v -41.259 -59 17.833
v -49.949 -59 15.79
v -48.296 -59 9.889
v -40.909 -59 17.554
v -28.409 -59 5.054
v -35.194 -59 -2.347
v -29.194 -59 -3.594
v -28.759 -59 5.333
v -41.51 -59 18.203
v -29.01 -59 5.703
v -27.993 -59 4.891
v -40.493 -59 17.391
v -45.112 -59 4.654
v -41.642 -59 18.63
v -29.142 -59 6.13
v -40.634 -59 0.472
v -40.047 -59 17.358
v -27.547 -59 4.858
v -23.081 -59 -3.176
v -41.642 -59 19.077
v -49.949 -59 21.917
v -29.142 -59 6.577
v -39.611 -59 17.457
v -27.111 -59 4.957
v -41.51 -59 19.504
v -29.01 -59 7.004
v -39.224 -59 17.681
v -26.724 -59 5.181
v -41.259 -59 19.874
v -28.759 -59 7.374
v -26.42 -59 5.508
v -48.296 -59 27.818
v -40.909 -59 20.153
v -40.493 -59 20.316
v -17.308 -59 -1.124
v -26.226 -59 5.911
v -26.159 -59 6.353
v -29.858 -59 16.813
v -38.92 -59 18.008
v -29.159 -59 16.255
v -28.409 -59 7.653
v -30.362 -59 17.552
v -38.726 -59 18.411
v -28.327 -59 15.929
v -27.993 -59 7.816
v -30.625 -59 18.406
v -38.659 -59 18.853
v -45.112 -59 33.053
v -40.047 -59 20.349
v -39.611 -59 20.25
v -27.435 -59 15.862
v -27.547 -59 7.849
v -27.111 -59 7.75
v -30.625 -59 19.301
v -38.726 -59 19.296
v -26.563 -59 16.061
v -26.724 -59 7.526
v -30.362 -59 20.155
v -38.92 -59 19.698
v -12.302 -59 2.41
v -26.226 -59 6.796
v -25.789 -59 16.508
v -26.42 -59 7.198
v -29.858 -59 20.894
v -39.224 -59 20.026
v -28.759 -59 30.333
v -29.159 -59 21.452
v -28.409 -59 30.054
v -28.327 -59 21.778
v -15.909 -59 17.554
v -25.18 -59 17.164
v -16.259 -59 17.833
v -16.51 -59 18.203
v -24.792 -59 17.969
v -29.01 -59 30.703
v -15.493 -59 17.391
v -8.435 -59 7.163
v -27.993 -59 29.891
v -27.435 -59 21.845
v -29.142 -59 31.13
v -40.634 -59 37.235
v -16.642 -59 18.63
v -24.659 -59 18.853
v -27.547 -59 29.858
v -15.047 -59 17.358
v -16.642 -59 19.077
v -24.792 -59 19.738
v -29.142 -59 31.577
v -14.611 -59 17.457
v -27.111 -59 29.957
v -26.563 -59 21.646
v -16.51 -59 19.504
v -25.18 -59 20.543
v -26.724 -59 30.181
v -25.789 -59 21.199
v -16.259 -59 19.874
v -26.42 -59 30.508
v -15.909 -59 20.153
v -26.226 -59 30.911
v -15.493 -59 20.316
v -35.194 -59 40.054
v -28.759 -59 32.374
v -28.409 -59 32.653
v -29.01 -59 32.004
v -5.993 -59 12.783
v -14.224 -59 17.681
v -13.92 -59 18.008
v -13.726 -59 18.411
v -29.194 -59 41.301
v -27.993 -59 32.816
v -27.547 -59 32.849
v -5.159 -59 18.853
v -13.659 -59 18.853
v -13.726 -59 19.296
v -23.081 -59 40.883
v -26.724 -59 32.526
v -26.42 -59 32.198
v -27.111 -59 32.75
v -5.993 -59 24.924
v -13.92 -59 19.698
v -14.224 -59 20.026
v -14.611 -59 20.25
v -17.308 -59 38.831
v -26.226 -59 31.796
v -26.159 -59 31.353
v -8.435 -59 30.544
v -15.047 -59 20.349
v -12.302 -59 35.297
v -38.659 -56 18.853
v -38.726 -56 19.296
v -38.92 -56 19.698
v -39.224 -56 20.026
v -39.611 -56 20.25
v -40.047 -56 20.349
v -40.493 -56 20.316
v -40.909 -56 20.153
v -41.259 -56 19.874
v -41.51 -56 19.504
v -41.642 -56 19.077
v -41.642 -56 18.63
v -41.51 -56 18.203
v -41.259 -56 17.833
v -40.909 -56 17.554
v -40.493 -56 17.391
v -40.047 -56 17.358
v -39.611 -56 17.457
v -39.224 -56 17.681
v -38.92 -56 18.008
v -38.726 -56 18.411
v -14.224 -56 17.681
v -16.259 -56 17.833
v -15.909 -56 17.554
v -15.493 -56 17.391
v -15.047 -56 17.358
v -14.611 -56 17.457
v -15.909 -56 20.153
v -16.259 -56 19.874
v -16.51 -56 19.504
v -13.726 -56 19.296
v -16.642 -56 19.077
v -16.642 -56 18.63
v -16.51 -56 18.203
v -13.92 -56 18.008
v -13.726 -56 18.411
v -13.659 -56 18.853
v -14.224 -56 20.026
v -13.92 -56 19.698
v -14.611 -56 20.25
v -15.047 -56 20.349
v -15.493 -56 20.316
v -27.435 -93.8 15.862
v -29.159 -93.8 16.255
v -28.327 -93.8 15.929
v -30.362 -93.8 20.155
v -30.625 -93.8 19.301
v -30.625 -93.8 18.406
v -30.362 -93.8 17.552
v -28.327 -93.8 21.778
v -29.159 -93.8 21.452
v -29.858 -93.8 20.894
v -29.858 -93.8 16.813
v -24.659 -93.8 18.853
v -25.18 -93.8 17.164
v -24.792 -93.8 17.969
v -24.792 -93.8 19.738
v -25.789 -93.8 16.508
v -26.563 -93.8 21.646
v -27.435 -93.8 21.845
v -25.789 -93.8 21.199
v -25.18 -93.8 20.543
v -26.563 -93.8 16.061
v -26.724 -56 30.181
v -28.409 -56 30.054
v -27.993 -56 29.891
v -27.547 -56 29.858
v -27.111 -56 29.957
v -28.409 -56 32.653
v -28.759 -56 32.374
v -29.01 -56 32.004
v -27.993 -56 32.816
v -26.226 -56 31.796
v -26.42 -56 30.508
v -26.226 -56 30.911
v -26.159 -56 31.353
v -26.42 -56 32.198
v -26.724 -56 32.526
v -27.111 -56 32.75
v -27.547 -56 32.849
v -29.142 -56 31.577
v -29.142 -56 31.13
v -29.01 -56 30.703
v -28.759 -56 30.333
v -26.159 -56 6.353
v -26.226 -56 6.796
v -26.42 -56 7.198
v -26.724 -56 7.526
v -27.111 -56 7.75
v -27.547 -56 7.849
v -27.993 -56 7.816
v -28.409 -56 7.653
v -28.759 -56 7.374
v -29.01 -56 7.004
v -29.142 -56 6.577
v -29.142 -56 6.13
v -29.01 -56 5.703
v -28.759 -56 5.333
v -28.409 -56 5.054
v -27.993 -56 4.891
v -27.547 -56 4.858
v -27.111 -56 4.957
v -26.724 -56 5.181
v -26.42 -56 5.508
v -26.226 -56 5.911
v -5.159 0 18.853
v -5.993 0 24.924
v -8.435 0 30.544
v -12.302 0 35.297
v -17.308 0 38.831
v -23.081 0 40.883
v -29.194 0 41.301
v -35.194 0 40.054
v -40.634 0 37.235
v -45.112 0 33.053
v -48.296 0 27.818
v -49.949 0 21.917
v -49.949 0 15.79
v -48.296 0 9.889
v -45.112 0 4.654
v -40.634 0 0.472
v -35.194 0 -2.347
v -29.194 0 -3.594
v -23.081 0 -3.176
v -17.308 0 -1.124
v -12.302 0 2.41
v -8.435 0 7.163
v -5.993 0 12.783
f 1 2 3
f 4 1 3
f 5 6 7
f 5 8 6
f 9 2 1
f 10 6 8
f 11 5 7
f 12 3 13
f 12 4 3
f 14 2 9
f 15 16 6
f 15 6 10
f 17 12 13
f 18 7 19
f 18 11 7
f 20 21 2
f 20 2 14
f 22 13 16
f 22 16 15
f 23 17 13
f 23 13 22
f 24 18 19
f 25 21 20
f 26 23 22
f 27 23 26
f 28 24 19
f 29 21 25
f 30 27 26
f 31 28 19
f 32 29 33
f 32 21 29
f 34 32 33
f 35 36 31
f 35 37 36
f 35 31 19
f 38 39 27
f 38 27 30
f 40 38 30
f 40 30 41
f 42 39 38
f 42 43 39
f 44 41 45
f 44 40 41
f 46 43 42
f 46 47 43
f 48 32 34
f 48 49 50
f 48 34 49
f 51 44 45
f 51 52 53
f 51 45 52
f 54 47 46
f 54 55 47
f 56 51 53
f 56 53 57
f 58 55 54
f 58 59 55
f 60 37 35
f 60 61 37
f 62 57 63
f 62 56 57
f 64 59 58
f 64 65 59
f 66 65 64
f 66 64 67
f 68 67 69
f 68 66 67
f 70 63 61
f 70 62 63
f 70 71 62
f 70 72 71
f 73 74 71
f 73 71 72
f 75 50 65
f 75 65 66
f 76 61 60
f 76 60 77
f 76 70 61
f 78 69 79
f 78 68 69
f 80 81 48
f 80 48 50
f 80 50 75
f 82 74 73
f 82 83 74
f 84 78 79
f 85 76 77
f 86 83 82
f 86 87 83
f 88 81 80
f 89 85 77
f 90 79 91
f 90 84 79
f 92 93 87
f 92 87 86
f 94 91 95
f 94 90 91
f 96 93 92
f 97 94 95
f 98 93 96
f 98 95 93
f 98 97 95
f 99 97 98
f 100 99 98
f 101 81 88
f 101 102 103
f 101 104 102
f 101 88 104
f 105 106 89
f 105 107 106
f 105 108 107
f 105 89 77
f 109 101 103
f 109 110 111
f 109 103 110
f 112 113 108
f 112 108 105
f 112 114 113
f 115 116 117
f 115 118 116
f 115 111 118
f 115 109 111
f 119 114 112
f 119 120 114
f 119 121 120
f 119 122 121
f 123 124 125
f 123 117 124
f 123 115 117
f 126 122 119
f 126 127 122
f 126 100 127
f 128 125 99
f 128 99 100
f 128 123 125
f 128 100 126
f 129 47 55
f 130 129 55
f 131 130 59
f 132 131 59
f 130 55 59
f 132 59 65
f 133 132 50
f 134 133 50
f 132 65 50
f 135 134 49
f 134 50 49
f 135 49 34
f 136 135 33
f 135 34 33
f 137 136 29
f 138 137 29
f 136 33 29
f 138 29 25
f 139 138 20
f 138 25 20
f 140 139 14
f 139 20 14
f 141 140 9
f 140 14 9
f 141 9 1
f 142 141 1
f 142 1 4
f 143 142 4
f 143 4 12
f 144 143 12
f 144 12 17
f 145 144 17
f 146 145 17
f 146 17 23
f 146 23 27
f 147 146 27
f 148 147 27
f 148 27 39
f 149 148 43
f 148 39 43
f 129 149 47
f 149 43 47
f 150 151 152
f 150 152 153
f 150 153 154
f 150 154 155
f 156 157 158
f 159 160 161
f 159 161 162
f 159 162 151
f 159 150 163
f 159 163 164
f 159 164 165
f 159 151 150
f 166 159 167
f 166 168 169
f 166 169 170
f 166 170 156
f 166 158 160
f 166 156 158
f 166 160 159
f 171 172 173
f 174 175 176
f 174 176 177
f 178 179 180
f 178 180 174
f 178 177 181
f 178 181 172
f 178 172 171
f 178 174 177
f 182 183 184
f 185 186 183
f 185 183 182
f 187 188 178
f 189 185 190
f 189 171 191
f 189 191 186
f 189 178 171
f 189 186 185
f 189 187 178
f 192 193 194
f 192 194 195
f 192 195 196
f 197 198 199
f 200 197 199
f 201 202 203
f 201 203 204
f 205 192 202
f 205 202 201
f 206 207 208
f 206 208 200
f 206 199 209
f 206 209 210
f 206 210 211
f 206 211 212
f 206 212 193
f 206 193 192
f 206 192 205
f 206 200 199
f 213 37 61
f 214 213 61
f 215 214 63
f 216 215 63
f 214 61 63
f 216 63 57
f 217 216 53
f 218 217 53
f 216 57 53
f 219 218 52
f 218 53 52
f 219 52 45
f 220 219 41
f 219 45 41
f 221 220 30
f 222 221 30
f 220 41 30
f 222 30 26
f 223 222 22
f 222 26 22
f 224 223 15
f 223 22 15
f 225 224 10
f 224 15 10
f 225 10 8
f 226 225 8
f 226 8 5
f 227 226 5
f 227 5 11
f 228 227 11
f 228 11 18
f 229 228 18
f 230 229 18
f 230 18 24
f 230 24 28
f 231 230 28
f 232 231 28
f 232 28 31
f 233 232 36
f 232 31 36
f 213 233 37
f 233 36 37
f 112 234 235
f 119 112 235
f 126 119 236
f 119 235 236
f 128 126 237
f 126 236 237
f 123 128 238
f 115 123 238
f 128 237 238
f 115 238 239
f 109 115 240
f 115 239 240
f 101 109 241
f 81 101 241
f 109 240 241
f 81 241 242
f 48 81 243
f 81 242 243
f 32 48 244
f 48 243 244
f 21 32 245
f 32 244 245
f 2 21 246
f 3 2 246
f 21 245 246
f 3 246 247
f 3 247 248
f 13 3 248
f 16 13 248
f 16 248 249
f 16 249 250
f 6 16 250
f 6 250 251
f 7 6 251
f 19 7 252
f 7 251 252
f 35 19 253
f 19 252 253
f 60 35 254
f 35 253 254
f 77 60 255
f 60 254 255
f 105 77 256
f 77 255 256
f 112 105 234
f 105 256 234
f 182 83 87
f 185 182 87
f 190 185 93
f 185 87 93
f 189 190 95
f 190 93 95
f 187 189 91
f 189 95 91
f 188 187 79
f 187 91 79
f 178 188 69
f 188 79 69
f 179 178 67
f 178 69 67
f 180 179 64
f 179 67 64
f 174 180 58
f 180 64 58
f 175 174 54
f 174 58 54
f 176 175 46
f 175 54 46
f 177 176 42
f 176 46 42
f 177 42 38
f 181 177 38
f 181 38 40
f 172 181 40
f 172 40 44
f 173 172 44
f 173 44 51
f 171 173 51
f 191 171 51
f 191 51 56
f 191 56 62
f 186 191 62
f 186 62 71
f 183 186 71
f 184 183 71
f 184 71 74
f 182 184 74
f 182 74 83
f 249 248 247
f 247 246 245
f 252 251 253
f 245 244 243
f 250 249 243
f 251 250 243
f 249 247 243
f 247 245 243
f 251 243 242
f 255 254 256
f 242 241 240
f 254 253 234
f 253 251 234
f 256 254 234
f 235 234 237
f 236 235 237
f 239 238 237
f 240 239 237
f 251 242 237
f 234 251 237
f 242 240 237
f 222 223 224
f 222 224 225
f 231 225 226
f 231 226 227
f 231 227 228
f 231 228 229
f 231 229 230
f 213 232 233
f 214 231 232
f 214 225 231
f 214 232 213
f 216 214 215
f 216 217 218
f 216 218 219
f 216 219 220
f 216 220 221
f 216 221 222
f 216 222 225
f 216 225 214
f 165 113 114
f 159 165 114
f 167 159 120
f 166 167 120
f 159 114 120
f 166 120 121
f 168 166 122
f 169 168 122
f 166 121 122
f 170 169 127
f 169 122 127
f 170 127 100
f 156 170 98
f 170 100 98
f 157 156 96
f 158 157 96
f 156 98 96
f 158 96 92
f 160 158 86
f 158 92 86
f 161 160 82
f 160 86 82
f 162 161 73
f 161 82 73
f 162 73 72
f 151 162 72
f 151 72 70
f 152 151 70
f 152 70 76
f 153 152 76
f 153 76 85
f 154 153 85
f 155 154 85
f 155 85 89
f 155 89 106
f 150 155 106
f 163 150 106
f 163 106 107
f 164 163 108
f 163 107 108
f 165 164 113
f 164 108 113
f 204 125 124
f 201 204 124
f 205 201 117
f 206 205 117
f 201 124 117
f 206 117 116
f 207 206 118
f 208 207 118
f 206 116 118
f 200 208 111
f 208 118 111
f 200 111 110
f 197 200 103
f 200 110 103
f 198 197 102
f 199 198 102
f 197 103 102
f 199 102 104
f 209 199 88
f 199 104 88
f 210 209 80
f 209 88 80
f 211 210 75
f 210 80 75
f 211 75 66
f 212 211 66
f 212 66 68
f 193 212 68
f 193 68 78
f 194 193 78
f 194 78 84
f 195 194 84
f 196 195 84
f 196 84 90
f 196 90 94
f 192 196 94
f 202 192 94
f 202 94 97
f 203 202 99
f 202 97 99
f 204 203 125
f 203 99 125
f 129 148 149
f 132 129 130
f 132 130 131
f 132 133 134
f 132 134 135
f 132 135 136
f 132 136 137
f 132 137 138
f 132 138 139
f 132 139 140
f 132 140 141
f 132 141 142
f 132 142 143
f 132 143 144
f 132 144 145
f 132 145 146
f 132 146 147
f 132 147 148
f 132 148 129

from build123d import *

# Parameters (mm, degrees)
F0_R     = 22.5
F0_R_2   = 3
F1_DEPTH = 59
F2_DEPTH = 93.8
F3_R     = 1.5
F4_DEPTH = 3


with BuildPart() as f1:
    # F0 (on Front) → F1 (new body)
    with BuildSketch(Plane.XZ):
        with Locations((-27.658976, 18.853478)):
            Circle(F0_R)
        with Locations((-27.658976, 18.853478)):
            Circle(F0_R_2, mode=Mode.SUBTRACT)
    extrude(amount=F1_DEPTH)

    # F0 (on Front) → F2 (join)
    with BuildSketch(Plane.XZ):
        with Locations((-27.658976, 18.853478)):
            Circle(F0_R_2)
    extrude(amount=F2_DEPTH)

    # F3 (on face) → F4 (cut)
    with BuildSketch(Plane.XZ.offset(59)):
        with Locations((-27.658976, 31.353478)):
            Circle(F3_R)
        with Locations((-40.158976, 18.853478)):
            Circle(F3_R)
        with Locations((-27.658976, 6.353478)):
            Circle(F3_R)
        with Locations((-15.158976, 18.853478)):
            Circle(F3_R)
    extrude(amount=-F4_DEPTH, mode=Mode.SUBTRACT)


solid = f1.part
